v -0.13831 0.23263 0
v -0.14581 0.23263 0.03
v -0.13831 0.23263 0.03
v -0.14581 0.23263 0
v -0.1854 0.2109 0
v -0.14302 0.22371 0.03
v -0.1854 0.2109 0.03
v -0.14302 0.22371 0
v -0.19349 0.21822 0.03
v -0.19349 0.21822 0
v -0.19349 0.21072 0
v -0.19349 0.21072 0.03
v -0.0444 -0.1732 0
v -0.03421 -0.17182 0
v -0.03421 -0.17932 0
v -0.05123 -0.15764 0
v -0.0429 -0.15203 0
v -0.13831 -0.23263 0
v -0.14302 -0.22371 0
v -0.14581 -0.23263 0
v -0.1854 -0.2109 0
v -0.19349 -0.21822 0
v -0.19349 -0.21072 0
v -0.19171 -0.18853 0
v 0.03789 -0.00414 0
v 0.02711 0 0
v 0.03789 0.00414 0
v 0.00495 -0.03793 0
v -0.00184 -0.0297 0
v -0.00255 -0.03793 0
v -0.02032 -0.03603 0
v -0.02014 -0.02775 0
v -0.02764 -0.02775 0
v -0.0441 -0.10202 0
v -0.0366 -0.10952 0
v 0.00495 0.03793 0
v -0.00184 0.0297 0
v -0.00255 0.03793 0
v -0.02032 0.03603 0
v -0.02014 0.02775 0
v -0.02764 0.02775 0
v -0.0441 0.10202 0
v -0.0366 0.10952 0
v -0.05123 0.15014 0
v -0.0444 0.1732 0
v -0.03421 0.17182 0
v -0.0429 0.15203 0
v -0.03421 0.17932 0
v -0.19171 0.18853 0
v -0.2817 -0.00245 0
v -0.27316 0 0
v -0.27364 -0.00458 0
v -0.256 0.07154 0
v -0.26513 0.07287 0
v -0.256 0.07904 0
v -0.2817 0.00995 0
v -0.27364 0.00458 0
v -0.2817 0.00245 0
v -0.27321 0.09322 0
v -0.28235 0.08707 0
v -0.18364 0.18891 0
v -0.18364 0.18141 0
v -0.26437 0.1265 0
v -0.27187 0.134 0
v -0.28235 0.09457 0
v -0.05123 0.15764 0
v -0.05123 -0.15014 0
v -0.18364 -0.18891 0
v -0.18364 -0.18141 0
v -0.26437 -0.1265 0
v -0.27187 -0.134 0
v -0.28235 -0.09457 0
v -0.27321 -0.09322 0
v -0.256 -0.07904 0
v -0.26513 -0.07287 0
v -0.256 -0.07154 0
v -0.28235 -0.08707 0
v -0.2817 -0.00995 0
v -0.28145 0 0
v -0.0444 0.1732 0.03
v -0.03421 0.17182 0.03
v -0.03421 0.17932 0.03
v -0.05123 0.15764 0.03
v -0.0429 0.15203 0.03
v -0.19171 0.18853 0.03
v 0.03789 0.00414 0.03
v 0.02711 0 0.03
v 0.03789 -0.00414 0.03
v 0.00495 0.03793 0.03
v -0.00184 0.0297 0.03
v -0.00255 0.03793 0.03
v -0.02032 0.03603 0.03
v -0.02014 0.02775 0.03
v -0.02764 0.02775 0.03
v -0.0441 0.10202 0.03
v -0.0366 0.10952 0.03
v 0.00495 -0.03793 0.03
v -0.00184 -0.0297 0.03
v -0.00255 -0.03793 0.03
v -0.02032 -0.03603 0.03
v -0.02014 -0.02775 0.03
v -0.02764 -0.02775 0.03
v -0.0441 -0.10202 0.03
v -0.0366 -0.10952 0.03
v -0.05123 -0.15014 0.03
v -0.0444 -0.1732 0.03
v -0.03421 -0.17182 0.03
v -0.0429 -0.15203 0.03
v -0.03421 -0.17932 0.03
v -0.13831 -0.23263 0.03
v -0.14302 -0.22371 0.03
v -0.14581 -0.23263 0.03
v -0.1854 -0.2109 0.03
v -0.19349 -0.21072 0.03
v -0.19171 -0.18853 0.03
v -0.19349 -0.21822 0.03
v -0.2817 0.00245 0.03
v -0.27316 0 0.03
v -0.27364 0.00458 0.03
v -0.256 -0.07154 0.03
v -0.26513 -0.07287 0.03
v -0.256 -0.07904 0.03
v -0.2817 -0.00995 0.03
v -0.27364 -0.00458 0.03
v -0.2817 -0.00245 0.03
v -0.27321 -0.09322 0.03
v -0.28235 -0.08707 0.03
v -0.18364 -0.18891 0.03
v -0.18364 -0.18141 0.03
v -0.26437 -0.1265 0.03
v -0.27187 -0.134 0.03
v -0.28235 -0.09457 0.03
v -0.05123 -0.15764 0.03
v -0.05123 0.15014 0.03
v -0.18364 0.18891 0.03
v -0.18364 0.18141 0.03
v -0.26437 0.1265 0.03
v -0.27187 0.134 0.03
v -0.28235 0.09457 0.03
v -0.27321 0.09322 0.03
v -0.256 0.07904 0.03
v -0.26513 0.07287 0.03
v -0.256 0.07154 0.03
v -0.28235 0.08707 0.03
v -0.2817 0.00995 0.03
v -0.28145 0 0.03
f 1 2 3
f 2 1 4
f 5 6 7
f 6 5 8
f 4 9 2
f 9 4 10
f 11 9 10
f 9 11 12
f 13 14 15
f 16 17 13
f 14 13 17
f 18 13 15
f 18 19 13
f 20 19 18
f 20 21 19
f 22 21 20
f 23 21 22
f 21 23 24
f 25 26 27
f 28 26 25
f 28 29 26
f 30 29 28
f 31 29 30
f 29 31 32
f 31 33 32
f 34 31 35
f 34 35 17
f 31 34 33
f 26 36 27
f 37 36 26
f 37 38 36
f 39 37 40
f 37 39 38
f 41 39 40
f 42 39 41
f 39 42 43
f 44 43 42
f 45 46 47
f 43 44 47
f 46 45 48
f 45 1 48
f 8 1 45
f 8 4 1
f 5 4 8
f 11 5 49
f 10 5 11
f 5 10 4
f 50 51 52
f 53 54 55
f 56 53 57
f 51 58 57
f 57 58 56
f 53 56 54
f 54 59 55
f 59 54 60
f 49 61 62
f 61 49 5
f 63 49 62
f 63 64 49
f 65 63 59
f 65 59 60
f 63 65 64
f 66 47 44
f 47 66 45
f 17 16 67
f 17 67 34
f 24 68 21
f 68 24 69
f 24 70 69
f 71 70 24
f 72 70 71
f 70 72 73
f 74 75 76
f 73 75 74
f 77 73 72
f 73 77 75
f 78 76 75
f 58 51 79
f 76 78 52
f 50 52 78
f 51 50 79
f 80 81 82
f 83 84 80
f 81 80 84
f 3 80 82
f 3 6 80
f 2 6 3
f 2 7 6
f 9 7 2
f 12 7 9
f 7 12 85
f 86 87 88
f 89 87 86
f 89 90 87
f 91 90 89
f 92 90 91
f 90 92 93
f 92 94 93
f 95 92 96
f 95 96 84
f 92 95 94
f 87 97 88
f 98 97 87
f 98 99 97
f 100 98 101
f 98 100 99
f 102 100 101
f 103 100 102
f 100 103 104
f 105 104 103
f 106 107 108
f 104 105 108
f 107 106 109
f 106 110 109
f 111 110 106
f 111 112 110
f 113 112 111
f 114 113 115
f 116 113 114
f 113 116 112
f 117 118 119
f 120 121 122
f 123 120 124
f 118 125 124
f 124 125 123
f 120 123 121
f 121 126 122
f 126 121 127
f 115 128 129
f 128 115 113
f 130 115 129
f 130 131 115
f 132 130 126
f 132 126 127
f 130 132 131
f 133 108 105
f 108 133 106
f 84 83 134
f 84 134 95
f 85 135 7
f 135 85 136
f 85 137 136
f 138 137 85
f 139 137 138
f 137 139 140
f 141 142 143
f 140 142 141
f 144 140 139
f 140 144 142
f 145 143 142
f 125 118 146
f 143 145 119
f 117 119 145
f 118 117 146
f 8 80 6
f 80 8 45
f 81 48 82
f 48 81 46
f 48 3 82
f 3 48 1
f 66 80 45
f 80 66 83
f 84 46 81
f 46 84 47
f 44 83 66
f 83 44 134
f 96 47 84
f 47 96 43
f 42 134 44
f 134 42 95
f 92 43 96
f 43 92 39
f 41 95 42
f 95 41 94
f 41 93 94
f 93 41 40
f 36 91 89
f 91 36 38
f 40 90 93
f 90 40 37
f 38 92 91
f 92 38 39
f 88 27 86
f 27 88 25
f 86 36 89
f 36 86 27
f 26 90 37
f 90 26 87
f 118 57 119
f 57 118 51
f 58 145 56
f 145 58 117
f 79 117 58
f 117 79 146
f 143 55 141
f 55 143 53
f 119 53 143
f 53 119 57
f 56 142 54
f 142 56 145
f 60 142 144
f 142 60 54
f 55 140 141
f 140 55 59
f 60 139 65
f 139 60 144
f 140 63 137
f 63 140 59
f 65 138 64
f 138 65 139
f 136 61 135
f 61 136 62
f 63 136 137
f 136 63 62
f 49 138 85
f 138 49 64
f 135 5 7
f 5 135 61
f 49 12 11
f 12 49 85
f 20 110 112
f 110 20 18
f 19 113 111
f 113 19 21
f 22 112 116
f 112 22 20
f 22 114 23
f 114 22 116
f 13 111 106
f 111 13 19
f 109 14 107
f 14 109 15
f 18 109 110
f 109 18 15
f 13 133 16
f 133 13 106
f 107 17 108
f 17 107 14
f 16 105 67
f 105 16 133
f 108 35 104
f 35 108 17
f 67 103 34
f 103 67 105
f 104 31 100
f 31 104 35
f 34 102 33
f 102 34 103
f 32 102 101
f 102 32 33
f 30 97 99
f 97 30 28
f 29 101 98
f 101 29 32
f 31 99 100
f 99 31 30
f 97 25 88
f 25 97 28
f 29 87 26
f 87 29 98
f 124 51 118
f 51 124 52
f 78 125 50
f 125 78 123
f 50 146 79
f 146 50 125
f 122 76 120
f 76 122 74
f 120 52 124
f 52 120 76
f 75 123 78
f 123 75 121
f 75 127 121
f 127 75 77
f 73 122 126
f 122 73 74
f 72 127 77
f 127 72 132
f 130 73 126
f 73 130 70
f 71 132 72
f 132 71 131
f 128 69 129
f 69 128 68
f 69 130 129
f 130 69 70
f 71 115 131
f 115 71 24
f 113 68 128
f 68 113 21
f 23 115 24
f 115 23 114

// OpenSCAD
step=15;
baser=rnd(1.4,2);
phase=rnd(360);

mag1=rnd(6)*baser;
rep1=round(rnd(0,8));
ophase1=rnd(360);

mag2=rnd(6)*baser;
rep2=round(rnd(3,10));
ophase2=rnd(360);

phase0=rnd(360);
r0=rnd(0,1);
phase1=rnd(360);
r1=rnd(0,1)/2;
phase2=rnd(360);
r2=rnd(0,1)/3;
phase3=rnd(360);
r3=rnd(0,1)/4;
phase8=rnd(360);
r8=rnd(0,1)/8;
rsym=round(rnd(0,rnd(16)));
msym=round(rnd(0,rsym));
rsum=baser+r0+r1+r2+r3+r8;
symmetries(){translate([-0.15,0,0])scale([0.25,0.25,1])symmetries(){it ();};}



module symmetries(){
for(j=[0:360/rsym:360])rotate([0,0,j]){
intersection(){
if(msym==0) children ();else union(){
    intersection(){
    children ();
    translate([-1,0,-0.05])scale([2,1,0.2])cube(1);
    }
    mirror([0,1,0]) intersection(){
    children ();
    translate([-1,0,-0.05])scale([2,1,0.2])cube(1);
    }}

if(rsym>1){intersection(){
rotate ([0,0,(360/rsym)*0.5])translate([-1,0,-0.05])scale([2,1,0.2])cube(1);
mirror([0,1,0])rotate ([0,0,(360/rsym)*0.5])translate([-1,0,-0.05])scale([2,1,0.2])cube(1);
}}else {scale([1,1,0.2])cube(2,center=true);
}
}}}

module it(){
for(i=[0:step:360]){hull(){
theta = i+ sin((i+ophase1)*rep1)*mag1+ sin((i+ophase2)*rep2)*mag2;
translate([
sin(theta+phase)*(baser+sin((i+phase0))*r0 +sin((i+phase1)*2)*r1+sin((i+phase2)*3)*r2+sin((i+phase3)*4)*r3+sin((i+phase8)*8)*r8)/rsum
,
cos(theta+phase)*(baser+sin((i+phase0))*r0+sin((i+phase1)*2)*r1+sin((i+phase2)*3)*r2+sin((i+phase3)*4)*r3+sin((i+phase8)*8)*r8)/rsum
,0

])cube(0.03,$fn=10);
ii=(i+step)%360;
theta2 = ii+ sin((ii+ophase1)*rep1)*mag1+ sin((ii+ophase2)*rep2)*mag2;
translate([
sin(theta2+phase)*(baser+sin((ii+phase0))*r0 +sin((ii+phase1)*2)*r1+sin((ii+phase2)*3)*r2+sin((ii+phase3)*4)*r3+sin((ii+phase8)*8)*r8)/rsum
,
cos(theta2+phase)*(baser+sin((ii+phase0))*r0+sin((ii+phase1)*2)*r1+sin((ii+phase2)*3)*r2+sin((ii+phase3)*4)*r3+sin((ii+phase8)*8)*r8)/rsum
,0

])cube(0.03,$fn=10);
}}}



function un(v)=v/max(len3(v),0.000001)*1;
function p2n(pa,pb,pc)=
let(u=pa-pb,v=pa-pc)un([u[1]*v[2]-u[2]*v[1],u[2]*v[0]-u[0]*v[2],u[0]*v[1]-u[1]*v[0]]);
function avrg(v)=sumv(v,max(0,len(v)-1))/len(v);
function lerp(start,end,bias)=(end*bias+start*(1-bias));
function len3(v)=len(v)==2?sqrt(pow(v[0],2)+pow(v[1],2)):sqrt(pow(v[0],2)+pow(v[1],2)+pow(v[2],2));
function sumv(v,i,s=0)=(i==s?v[i]:v[i]+sumv(v,i-1,s));
function rnd(a=0,b=1)=(rands(min(a,b),max(a,b),1)[0]);
function rndc()=[rands(0,1,1)[0],rands(0,1,1)[0],rands(0,1,1)[0]];
